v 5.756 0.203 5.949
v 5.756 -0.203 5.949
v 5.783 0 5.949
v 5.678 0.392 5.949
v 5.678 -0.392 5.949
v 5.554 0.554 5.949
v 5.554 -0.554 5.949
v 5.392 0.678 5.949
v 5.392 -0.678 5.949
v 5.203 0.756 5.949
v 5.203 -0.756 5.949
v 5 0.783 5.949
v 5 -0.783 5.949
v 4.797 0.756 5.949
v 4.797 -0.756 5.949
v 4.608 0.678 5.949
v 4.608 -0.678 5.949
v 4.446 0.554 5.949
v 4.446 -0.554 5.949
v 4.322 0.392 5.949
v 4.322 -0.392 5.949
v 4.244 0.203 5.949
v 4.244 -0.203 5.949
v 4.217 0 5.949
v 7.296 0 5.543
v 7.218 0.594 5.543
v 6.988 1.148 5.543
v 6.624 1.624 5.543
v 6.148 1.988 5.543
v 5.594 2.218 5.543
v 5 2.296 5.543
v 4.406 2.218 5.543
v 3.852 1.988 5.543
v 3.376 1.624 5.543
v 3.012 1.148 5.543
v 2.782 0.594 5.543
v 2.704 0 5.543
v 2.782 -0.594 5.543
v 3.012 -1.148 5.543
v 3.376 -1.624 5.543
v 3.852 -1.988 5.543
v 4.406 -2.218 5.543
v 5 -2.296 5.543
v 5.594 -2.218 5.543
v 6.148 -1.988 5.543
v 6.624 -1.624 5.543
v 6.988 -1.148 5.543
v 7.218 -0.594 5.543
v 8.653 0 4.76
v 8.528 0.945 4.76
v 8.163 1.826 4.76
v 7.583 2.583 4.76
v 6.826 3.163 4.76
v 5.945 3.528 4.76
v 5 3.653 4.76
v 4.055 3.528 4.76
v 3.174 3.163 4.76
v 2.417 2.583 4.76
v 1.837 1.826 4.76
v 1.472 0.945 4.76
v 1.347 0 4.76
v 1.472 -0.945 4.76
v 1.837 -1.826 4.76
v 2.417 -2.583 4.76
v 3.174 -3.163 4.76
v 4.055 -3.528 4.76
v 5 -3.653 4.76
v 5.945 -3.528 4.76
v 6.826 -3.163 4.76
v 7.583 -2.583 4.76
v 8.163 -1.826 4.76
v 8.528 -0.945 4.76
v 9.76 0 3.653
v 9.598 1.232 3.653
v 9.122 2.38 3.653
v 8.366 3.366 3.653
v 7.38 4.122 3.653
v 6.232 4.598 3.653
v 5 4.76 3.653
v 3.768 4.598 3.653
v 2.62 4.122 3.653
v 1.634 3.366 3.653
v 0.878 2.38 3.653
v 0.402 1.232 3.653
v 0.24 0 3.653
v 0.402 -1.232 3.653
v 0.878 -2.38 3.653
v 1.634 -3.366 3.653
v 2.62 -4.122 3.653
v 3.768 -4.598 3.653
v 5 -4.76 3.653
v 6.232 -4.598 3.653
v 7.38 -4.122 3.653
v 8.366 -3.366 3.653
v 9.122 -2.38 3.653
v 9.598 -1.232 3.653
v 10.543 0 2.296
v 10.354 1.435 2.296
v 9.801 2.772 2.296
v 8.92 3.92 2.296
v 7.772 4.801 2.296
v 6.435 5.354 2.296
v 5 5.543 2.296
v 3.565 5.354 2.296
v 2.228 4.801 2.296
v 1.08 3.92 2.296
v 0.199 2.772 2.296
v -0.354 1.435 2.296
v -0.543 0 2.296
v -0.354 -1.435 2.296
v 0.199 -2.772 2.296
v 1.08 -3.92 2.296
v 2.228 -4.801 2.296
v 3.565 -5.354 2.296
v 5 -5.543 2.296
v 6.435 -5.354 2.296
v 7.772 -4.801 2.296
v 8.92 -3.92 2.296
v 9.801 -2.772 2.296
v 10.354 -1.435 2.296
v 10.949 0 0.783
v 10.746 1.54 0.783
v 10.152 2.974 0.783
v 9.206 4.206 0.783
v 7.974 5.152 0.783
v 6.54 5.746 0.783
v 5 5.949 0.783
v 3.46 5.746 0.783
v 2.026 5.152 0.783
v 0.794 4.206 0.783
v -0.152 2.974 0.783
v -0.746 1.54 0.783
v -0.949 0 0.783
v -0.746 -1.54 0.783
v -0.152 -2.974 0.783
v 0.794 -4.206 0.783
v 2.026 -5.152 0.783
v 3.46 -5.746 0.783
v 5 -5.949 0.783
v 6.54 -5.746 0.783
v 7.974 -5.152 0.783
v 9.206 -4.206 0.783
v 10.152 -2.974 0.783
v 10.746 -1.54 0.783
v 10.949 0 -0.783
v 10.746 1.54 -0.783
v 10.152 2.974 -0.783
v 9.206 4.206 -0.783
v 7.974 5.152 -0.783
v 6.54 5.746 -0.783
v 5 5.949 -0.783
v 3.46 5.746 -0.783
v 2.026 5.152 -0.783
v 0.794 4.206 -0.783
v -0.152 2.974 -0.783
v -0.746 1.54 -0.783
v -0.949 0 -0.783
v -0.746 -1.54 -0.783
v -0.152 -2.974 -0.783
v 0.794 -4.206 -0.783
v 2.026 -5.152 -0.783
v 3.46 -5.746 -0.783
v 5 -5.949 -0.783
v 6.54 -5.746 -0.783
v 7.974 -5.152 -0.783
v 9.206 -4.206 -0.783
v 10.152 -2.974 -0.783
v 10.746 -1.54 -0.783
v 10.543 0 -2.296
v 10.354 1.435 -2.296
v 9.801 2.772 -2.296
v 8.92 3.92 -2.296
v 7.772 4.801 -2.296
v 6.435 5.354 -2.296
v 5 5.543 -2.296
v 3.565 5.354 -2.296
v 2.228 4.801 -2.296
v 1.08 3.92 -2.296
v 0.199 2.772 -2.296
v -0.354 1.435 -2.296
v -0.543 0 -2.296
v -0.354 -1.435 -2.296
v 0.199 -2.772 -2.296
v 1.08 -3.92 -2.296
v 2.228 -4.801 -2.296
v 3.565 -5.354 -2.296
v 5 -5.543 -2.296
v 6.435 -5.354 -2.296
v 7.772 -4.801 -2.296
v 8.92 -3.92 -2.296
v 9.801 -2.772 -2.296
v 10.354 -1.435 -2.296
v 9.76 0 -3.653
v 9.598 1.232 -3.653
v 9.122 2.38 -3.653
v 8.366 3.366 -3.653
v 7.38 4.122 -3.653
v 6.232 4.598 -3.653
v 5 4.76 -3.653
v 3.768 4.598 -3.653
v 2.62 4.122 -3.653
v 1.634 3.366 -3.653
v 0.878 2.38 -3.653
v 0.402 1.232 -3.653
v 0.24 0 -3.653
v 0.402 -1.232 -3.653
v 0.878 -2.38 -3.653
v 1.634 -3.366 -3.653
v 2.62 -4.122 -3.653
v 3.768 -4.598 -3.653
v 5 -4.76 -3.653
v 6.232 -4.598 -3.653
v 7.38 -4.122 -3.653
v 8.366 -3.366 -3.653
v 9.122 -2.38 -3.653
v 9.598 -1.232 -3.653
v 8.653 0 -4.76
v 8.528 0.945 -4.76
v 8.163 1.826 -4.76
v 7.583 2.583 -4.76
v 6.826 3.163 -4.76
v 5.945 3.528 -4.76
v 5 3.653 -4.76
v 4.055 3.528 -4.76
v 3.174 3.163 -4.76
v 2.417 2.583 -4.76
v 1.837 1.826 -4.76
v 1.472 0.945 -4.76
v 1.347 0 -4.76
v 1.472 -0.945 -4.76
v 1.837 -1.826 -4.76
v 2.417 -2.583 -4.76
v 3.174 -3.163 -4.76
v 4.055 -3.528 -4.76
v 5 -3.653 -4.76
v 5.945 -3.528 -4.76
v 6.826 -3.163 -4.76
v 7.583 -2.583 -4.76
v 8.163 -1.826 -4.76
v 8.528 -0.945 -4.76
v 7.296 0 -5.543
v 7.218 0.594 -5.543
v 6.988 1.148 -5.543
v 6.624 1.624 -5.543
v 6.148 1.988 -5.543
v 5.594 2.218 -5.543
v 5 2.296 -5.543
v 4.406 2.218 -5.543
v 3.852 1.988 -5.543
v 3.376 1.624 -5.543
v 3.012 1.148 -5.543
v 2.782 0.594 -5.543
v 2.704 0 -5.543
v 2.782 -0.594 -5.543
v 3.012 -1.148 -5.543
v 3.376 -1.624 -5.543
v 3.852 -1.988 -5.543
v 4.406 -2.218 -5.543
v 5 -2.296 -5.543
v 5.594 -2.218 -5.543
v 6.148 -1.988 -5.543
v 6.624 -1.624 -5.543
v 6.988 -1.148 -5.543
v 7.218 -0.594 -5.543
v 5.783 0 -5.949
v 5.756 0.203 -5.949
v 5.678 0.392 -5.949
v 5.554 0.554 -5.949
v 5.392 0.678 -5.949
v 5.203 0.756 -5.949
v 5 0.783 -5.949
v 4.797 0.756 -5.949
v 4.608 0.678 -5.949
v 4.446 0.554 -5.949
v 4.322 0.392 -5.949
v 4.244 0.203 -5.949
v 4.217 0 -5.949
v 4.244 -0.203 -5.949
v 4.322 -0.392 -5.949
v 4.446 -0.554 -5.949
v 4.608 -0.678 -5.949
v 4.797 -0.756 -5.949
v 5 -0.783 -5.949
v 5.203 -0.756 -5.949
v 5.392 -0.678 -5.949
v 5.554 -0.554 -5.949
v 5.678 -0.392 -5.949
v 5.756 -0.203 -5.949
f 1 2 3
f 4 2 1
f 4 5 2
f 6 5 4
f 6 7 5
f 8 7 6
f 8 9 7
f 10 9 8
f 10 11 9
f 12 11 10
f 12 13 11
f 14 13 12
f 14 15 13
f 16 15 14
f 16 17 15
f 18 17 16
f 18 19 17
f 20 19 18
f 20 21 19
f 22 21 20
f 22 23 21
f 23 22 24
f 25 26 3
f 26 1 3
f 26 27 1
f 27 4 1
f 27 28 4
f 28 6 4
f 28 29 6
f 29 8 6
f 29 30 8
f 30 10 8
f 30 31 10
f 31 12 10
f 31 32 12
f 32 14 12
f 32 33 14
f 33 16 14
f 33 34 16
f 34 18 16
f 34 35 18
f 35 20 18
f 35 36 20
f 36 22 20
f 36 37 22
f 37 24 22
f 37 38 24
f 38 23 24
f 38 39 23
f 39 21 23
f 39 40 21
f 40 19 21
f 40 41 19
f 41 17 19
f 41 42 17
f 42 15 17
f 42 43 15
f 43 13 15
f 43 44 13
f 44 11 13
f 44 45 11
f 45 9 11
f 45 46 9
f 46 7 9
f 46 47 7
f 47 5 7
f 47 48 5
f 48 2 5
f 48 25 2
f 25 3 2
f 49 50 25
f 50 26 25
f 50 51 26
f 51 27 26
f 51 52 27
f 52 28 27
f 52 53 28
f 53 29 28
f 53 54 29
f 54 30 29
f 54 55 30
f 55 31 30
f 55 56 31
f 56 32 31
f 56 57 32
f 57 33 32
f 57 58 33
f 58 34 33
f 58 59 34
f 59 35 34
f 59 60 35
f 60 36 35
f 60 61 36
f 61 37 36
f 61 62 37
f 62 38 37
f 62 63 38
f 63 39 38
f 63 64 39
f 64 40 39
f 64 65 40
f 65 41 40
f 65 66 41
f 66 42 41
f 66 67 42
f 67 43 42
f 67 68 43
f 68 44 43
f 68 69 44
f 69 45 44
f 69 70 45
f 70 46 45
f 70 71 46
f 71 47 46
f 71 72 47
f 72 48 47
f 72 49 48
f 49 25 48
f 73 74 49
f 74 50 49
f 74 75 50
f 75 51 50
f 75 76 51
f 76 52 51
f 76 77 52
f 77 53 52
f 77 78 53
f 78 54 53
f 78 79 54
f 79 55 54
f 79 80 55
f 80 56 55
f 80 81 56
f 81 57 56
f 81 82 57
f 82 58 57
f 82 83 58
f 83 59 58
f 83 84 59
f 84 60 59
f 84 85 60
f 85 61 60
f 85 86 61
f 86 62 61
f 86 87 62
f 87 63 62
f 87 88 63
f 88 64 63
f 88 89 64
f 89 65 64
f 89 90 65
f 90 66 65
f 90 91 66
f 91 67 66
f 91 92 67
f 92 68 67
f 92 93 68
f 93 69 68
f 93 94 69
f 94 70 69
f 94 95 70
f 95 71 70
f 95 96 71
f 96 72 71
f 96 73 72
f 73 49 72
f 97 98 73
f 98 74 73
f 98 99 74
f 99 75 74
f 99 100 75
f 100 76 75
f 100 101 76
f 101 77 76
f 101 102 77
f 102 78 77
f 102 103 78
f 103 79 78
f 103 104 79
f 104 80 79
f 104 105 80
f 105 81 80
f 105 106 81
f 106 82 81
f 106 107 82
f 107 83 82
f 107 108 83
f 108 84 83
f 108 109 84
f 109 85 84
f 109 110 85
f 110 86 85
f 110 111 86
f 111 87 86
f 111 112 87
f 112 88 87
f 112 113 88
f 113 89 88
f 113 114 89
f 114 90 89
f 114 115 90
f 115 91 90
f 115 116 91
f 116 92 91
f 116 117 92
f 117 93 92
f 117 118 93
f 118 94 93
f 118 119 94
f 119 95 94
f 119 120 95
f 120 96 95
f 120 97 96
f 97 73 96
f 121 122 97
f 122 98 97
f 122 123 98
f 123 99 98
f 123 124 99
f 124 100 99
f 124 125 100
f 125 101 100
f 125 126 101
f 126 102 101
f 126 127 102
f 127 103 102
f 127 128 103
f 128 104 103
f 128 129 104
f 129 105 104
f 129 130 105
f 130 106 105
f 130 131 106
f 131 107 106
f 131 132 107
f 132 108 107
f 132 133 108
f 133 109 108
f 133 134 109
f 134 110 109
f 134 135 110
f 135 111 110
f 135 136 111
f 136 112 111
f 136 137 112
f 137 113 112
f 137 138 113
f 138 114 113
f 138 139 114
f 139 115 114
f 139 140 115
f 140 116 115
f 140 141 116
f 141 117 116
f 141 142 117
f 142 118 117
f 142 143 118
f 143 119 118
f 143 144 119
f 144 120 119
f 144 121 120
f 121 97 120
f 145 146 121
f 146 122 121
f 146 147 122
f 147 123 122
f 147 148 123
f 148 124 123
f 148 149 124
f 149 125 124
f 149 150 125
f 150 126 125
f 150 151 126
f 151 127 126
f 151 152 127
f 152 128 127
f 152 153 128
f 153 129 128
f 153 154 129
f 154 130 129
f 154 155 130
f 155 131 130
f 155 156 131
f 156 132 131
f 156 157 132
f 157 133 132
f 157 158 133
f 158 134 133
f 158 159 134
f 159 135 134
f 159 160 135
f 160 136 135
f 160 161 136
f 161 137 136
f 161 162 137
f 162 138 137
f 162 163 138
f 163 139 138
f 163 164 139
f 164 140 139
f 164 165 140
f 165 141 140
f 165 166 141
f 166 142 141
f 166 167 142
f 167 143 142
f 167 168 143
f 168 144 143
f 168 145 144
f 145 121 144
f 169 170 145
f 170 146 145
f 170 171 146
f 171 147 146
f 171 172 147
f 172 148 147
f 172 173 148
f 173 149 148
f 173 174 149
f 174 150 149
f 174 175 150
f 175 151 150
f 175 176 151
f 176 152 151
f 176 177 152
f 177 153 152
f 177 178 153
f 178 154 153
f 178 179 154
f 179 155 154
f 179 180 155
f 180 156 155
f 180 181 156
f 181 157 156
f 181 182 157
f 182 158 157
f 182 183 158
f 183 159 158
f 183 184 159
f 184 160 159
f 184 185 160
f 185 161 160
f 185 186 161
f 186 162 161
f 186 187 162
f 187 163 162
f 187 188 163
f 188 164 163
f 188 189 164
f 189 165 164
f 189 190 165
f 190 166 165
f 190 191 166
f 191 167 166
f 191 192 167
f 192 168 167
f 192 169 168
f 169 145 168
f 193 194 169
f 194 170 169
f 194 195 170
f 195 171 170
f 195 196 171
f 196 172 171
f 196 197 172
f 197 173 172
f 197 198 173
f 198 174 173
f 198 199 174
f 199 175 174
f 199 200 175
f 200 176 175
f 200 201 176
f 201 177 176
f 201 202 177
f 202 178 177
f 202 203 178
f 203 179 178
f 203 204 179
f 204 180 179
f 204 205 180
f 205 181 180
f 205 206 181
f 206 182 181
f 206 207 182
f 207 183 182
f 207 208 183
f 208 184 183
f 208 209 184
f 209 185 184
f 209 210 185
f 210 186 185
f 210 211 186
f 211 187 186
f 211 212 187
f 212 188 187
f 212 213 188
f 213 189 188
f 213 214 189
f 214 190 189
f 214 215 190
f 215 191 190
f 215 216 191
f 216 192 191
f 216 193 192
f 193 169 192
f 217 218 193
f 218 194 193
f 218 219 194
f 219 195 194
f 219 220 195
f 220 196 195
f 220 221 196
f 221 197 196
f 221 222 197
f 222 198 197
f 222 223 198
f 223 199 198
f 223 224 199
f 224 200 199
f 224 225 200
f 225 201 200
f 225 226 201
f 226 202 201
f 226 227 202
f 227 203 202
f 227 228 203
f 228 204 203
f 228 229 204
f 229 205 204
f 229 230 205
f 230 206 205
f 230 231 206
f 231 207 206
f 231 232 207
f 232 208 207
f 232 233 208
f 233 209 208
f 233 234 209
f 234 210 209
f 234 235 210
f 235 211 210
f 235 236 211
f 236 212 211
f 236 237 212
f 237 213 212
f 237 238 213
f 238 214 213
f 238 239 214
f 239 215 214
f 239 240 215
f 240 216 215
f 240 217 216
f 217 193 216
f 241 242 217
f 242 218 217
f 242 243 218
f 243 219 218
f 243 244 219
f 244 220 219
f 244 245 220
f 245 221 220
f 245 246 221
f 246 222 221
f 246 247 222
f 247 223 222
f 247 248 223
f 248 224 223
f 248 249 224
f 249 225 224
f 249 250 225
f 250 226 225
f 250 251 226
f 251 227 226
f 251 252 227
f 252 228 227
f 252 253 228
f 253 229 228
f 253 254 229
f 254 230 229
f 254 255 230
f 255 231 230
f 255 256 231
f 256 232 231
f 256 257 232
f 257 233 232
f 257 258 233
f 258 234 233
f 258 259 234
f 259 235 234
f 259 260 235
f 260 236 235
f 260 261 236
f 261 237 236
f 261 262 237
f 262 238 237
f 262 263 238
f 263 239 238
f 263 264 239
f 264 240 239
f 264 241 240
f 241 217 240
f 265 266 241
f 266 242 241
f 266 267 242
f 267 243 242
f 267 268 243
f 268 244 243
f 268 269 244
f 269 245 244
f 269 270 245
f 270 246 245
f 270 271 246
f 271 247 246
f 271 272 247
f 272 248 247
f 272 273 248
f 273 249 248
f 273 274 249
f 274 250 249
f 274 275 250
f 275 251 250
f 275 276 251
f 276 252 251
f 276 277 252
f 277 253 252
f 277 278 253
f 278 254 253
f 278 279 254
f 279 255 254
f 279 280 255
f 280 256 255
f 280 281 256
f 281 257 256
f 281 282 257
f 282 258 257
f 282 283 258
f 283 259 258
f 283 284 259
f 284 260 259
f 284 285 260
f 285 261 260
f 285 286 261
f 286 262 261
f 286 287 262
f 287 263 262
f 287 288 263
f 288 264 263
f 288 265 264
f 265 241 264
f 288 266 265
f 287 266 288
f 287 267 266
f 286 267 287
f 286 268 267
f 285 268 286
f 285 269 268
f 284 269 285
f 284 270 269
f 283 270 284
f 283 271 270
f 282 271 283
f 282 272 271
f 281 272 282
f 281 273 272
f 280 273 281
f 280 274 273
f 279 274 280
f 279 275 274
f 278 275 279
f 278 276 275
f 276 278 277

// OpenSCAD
// `!` promotes its subtree to the whole model: only the sphere survives, the
// cube and everything else is dropped.
cube(50);
!translate([5,0,0]) sphere(6, $fn=24);
cylinder(h=30, r=4);
